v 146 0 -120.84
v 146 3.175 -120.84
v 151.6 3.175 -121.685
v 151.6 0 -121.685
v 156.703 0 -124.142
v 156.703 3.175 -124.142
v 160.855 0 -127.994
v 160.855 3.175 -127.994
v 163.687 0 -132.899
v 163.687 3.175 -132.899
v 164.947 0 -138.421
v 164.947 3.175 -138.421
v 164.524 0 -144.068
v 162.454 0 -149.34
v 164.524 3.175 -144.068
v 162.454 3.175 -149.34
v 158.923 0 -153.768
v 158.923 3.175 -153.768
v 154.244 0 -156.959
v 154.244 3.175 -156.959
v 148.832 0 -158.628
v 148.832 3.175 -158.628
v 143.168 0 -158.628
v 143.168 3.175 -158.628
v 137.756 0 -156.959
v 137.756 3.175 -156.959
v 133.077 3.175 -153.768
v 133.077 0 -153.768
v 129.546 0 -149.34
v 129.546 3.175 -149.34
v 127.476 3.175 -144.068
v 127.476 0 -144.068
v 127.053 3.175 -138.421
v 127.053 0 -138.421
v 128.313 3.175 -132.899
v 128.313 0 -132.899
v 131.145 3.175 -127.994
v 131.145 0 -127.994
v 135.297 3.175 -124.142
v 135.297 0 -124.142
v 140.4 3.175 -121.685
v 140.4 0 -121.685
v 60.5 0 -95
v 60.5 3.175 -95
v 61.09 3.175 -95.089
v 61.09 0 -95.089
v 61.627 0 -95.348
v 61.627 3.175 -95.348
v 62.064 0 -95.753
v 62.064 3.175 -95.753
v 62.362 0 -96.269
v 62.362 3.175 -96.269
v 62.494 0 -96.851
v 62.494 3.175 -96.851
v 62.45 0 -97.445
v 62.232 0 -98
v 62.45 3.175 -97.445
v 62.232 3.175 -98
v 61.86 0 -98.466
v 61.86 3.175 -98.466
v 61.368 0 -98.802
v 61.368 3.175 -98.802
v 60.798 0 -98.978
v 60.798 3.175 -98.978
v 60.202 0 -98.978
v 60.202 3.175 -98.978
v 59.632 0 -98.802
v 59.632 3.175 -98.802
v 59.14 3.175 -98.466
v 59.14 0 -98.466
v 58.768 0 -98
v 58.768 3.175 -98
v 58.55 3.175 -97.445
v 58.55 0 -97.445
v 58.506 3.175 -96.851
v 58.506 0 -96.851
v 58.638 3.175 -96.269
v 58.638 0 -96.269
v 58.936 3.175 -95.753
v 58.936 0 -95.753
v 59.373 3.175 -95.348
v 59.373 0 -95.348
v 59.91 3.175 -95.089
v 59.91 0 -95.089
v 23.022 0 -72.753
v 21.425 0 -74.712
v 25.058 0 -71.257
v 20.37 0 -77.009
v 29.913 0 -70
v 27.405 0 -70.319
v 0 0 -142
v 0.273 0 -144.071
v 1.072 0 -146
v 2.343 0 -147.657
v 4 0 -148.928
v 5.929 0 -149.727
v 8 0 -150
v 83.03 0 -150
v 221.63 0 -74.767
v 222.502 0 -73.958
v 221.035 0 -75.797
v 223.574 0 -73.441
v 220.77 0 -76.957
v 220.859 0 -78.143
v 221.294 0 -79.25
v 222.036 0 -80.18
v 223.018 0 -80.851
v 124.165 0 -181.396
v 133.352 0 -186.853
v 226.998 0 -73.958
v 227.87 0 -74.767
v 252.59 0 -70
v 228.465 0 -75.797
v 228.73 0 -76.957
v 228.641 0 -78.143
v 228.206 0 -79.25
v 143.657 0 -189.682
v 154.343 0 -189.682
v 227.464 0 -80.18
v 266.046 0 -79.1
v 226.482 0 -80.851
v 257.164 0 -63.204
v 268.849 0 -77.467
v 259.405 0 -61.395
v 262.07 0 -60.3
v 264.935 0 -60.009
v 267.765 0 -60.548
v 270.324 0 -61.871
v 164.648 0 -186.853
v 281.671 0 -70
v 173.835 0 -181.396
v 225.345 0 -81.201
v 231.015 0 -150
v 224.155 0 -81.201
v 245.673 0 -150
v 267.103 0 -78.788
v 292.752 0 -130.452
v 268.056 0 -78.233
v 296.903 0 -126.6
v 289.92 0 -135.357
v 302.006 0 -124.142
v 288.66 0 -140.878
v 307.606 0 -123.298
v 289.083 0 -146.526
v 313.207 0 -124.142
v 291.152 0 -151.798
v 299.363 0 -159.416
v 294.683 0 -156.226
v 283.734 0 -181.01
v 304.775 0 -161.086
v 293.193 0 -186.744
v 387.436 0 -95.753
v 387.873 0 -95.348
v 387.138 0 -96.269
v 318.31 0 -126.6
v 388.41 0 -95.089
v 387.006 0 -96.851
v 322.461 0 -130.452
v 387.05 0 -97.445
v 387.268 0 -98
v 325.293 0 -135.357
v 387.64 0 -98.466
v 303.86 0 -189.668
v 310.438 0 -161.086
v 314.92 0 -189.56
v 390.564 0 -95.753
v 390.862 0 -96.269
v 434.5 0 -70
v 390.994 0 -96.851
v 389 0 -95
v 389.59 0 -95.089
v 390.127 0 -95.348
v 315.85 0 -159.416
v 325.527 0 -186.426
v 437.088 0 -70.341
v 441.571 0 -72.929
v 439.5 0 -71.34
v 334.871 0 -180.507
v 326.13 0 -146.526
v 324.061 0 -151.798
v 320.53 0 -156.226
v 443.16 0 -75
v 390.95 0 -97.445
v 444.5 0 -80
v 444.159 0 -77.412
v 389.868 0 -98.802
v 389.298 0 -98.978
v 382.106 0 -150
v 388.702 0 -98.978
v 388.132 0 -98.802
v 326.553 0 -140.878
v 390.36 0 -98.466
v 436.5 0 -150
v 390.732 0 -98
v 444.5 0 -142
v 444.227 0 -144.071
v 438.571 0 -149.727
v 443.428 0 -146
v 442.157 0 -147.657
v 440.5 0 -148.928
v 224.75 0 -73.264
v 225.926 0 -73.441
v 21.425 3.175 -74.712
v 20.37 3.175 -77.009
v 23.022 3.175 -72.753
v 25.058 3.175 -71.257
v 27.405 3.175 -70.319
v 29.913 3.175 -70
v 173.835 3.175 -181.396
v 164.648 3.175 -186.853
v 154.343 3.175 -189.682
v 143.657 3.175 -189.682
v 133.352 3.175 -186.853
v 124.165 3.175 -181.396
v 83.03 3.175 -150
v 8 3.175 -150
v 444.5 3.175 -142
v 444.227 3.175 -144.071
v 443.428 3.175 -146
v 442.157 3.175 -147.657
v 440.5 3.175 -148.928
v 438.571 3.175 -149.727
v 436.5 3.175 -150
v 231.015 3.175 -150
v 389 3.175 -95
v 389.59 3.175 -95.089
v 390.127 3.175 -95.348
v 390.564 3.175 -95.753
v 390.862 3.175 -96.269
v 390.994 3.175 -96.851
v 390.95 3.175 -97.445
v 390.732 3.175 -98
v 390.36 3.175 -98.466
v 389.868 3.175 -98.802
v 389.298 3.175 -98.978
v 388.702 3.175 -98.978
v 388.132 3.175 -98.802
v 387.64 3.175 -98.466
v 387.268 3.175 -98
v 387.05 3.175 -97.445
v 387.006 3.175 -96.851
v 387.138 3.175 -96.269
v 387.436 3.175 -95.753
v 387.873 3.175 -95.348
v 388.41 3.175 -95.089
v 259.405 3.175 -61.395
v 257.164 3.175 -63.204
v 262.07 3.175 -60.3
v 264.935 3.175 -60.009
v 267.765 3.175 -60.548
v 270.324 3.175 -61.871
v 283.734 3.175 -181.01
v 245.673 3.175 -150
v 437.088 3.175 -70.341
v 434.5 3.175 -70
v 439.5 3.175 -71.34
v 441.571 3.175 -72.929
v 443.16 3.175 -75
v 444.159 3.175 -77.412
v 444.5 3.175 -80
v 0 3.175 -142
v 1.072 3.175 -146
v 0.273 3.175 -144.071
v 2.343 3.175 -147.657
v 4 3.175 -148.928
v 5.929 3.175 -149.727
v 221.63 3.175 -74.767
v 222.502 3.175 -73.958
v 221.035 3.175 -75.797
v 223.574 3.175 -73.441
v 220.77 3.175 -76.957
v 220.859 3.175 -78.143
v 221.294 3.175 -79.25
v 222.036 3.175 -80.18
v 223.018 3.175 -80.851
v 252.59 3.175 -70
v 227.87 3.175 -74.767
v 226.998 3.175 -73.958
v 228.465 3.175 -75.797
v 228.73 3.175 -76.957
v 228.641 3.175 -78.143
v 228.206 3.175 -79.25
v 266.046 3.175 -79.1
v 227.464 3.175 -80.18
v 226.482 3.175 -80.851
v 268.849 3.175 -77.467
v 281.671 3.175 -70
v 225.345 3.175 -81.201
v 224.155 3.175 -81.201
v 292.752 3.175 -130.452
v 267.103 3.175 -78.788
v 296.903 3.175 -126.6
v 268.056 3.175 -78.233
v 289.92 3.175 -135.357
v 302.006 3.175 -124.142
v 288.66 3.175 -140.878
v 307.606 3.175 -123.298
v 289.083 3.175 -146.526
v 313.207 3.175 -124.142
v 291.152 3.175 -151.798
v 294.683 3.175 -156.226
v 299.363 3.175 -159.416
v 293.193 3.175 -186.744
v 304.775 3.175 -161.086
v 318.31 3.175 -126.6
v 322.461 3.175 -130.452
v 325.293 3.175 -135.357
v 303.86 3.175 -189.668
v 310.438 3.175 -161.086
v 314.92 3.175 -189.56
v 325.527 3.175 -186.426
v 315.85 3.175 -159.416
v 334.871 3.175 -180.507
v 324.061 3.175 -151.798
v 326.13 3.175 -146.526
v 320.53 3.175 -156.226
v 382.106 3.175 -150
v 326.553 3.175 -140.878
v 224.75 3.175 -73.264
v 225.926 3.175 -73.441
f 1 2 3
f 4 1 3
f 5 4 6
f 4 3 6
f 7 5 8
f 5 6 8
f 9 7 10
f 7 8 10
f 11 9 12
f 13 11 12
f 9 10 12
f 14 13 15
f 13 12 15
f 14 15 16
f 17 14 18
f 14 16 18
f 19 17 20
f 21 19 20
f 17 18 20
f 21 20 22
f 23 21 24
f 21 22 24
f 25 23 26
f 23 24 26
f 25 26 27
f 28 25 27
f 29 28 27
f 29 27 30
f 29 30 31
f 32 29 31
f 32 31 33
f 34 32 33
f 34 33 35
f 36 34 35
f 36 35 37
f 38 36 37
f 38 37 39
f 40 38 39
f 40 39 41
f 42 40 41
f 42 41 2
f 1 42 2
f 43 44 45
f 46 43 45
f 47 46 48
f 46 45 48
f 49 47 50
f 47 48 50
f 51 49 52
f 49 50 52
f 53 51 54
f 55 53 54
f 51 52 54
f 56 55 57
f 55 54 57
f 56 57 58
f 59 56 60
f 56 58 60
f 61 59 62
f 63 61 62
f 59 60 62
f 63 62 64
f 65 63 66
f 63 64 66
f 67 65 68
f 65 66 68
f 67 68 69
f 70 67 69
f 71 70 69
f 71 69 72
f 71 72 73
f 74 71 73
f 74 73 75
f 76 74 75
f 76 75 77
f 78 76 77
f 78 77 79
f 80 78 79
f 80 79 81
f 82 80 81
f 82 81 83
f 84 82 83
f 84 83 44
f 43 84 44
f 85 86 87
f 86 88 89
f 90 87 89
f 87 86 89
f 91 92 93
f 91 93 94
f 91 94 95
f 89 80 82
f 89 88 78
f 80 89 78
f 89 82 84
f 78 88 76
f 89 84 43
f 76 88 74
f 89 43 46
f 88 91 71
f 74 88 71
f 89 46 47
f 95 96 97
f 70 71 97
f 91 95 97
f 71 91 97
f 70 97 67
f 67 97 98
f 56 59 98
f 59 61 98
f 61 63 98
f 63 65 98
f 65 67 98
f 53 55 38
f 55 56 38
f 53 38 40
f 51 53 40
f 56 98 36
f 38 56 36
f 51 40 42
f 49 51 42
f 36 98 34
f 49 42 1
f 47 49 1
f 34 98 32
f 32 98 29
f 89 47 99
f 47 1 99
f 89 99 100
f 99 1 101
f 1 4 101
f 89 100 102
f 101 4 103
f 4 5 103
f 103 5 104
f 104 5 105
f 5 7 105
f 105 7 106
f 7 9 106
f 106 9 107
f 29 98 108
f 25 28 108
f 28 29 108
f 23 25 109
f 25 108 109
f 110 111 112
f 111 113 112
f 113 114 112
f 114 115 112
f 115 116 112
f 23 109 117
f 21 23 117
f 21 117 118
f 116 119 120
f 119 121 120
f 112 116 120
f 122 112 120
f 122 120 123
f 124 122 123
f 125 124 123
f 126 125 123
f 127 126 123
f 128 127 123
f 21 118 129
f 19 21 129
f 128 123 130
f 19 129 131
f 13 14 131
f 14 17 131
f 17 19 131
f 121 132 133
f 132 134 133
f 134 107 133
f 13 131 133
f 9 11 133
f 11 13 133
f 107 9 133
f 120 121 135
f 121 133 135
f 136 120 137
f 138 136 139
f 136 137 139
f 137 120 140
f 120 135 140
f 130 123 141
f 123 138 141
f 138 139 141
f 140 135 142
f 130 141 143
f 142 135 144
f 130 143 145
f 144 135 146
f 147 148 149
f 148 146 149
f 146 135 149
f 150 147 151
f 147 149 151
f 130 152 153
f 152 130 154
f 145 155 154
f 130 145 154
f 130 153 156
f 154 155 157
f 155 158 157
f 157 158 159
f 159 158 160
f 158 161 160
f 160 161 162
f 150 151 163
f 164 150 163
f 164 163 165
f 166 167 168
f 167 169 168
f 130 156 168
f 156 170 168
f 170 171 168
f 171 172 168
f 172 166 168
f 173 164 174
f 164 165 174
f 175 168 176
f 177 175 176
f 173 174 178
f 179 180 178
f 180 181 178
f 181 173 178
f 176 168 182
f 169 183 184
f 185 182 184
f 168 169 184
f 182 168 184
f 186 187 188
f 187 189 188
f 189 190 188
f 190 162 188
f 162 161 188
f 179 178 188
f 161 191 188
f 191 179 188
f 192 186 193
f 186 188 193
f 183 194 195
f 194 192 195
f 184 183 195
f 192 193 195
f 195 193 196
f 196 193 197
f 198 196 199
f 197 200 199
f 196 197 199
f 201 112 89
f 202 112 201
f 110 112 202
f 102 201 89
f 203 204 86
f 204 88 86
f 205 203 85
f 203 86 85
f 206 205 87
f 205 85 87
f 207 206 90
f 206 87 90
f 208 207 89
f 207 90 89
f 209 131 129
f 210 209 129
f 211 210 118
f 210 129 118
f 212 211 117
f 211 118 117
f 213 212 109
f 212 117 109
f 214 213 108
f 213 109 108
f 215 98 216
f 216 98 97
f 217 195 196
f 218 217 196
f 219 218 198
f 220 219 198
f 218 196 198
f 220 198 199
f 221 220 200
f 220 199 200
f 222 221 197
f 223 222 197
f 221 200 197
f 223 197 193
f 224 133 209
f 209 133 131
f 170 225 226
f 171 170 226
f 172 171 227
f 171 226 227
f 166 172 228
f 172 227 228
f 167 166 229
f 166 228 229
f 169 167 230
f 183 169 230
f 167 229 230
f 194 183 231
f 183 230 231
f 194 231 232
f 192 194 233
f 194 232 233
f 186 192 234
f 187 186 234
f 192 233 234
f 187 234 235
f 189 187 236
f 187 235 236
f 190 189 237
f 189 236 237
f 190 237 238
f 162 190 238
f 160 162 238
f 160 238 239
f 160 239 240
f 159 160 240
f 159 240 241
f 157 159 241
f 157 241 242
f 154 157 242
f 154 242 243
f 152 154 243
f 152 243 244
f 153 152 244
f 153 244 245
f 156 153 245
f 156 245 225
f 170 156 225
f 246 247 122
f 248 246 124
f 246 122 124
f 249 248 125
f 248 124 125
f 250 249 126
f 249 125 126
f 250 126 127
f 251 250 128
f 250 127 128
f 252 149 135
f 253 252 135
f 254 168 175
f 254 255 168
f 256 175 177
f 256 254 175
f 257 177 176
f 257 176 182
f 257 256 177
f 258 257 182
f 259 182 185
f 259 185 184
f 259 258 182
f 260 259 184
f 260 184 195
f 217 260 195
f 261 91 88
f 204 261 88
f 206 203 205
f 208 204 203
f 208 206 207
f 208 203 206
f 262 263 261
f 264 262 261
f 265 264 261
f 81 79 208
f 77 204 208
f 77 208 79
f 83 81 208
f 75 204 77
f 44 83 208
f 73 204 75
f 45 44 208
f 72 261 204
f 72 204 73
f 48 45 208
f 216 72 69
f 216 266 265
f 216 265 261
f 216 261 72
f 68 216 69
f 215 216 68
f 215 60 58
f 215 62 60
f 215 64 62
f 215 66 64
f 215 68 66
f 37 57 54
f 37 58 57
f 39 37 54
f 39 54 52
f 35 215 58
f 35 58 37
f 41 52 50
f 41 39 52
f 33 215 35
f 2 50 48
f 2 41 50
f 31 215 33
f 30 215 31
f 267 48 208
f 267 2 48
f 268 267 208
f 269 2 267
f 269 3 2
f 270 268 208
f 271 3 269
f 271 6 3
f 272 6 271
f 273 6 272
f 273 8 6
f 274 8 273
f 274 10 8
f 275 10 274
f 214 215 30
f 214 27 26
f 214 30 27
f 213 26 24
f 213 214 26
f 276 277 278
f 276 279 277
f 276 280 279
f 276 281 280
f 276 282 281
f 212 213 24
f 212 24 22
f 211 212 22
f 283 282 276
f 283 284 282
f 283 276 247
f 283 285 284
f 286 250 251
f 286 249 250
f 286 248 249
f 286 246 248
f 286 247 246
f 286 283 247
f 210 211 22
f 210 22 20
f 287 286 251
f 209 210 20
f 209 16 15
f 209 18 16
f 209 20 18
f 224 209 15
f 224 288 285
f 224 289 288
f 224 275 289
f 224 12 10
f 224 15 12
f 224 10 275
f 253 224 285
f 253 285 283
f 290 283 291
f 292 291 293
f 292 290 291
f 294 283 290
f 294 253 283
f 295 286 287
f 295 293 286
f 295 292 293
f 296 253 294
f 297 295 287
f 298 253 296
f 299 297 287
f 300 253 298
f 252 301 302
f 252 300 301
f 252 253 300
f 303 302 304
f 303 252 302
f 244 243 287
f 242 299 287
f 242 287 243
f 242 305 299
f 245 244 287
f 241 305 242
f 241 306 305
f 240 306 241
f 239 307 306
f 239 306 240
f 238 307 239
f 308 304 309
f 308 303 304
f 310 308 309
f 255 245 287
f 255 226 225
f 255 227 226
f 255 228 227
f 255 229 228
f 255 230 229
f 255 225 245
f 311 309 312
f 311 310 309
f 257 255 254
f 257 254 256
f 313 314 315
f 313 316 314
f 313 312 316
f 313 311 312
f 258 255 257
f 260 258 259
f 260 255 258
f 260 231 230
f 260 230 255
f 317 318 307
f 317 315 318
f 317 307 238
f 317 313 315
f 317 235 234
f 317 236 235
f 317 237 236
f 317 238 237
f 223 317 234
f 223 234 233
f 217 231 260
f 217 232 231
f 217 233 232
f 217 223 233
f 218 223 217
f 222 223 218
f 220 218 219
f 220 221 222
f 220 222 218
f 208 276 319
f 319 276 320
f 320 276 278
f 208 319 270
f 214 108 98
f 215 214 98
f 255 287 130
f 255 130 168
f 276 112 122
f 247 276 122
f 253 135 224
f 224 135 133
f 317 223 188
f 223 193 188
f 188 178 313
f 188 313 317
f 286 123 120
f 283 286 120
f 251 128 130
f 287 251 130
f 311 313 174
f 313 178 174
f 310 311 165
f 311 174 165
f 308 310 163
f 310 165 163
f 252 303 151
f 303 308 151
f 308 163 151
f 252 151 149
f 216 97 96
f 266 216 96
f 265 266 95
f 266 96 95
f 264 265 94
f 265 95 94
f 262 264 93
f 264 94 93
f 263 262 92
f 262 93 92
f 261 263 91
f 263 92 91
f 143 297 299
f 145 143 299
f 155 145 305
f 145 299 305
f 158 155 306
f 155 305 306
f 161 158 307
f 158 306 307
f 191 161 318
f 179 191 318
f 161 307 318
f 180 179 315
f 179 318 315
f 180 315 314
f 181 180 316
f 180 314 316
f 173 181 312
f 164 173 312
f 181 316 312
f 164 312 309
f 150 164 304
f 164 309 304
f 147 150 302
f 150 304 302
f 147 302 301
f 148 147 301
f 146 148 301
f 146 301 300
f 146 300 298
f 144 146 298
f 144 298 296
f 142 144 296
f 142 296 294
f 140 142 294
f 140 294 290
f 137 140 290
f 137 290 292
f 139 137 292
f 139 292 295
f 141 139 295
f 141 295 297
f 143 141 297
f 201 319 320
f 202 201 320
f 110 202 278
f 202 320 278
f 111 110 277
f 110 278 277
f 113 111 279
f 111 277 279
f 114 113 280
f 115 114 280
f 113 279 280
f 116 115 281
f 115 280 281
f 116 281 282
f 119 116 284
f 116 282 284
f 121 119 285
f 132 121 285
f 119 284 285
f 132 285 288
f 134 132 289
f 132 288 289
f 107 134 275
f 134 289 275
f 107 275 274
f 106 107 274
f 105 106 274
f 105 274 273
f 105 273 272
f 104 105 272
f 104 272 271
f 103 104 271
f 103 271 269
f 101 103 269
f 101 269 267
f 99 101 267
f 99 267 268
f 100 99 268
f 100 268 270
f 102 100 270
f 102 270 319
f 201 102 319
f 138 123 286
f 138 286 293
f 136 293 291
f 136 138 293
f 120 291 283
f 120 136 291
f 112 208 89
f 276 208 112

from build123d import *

# Parameters (mm, degrees)
SKETCH1_R                = 4.6
BOSS_EXTRUDE1_DEPTH      = 3.175
SKETCH2_W                = 597.466303312
SKETCH2_H                = 60.972543052
CUT_EXTRUDE1_DEPTH       = 70
FILLET1_R                = 10
FILLET2_R                = 10
SKETCH3_R                = 3.990837639
CUT_EXTRUDE2_DEPTH       = 10
SKETCH4_R                = 2
CUT_EXTRUDE3_DEPTH       = 470.13785887
SKETCH5_R                = 2
CUT_EXTRUDE4_DEPTH       = 10
SKETCH6_R                = 40
BOSS_EXTRUDE2_DEPTH      = 3.175
BOSS_EXTRUDE3_DEPTH      = 3.175
SKETCH9_R                = 40
BOSS_EXTRUDE4_DEPTH      = 3.175
BOSS_EXTRUDE6_DEPTH      = 3.175
SKETCH13_R               = 19
CUT_EXTRUDE5_DEPTH       = 10
SKETCH14_R               = 19
CUT_EXTRUDE6_DEPTH       = 10
BOSS_EXTRUDE7_DEPTH      = 10
BOSS_EXTRUDE7_DEPTH_BACK = 3.175
SKETCH16_W               = 39.380598922
SKETCH16_H               = 33.904845405
CUT_EXTRUDE7_DEPTH       = 10


with BuildPart() as part:
    # Sketch1 → Boss-Extrude1 (new body)
    with BuildSketch(Plane(origin=(0, 0, 0), x_dir=(1, 0, 0), z_dir=(0, 1, 0))):
        with BuildLine():
            ThreePointArc((8, 150), (2.343145751, 147.656854249), (0, 142))
            Line((0, 142), (42, 8))
            ThreePointArc((42, 8), (44.343145751, 2.343145751), (50, 0))
            Line((50, 0), (436.5, 0))
            ThreePointArc((436.5, 0), (442.156854249, 2.343145751), (444.5, 8))
            Line((444.5, 8), (444.5, 142))
            ThreePointArc((444.5, 142), (442.156854249, 147.656854249), (436.5, 150))
            Line((436.5, 150), (172.868406334, 150))
            ThreePointArc((172.868406334, 150), (172.5, 146.64039861), (172.131593666, 150))
            Line((172.131593666, 150), (8, 150))
        make_face()
        with Locations(Location((265.281257274, 74.563866981, 0), (0, 0, 270))):
            Circle(SKETCH1_R, mode=Mode.SUBTRACT)
    extrude(amount=BOSS_EXTRUDE1_DEPTH)

    # Sketch2 → Cut-Extrude1 (cut)
    with BuildSketch(Plane.XY):
        with Locations((220.1785332, 7.544358636)):
            Rectangle(SKETCH2_W, SKETCH2_H)
    extrude(amount=-CUT_EXTRUDE1_DEPTH, mode=Mode.SUBTRACT)

    # Fillet1
    fillet1_edges = [part.edges().sort_by_distance(p)[0] for p in [
        (22.567164179, 1.5875, -70),
    ]]
    fillet(fillet1_edges, radius=FILLET1_R)

    # Fillet2
    fillet2_edges = [part.edges().sort_by_distance(p)[0] for p in [
        (444.5, 1.5875, -70),
    ]]
    fillet(fillet2_edges, radius=FILLET2_R)

    # Sketch3 → Cut-Extrude2 (cut)
    with BuildSketch(Plane(origin=(0, 3.175, 0), x_dir=(1, 0, 0), z_dir=(0, 1, 0))):
        with Locations(Location((224.75, 77.255, 0), (0, 0, 270))):
            Circle(SKETCH3_R)
    extrude(amount=-CUT_EXTRUDE2_DEPTH, mode=Mode.SUBTRACT)

    # Sketch4 → Cut-Extrude3 (cut, through all)
    with BuildSketch(Plane(origin=(0, 3.175, 0), x_dir=(1, 0, 0), z_dir=(0, 1, 0))):
        with Locations(Location((60.5, 97, 0), (0, 0, 270))):
            Circle(SKETCH4_R)
    extrude(amount=-CUT_EXTRUDE3_DEPTH, mode=Mode.SUBTRACT)

    # Sketch5 → Cut-Extrude4 (cut)
    with BuildSketch(Plane(origin=(0, 3.175, 0), x_dir=(1, 0, 0), z_dir=(0, 1, 0))):
        with Locations(Location((389, 97, 0), (0, 0, 270))):
            Circle(SKETCH5_R)
    extrude(amount=-CUT_EXTRUDE4_DEPTH, mode=Mode.SUBTRACT)

    # Sketch6 → Boss-Extrude2 (add)
    with BuildSketch(Plane(origin=(0, 0, 0), x_dir=(1, 0, 0), z_dir=(0, 1, 0))):
        with Locations((149, 150.04039861)):
            Circle(SKETCH6_R)
    extrude(amount=BOSS_EXTRUDE2_DEPTH)

    # Sketch7 → Boss-Extrude3 (add)
    with BuildSketch(Plane(origin=(0, 0, 0), x_dir=(1, 0, 0), z_dir=(0, 1, 0))):
        Polygon((124.164543783, 181.396420591), (82.702881078, 149.750534228), (231.468946681, 149.750534228), (173.835456217, 181.396420591), align=None)
    extrude(amount=BOSS_EXTRUDE3_DEPTH)

    # Sketch9 → Boss-Extrude4 (add)
    with BuildSketch(Plane(origin=(0, 0, 0), x_dir=(1, 0, 0), z_dir=(0, 1, 0))):
        with BuildLine():
            ThreePointArc((269, 150), (272.870833001, 167.166341835), (283.734164599, 181.010281545))
            Line((283.734164599, 181.010281545), (245.673378314, 150))
            Line((245.673378314, 150), (269, 150))
        make_face()
        with Locations((309, 150)):
            Circle(SKETCH9_R)
    extrude(amount=BOSS_EXTRUDE4_DEPTH)

    # Sketch12 → Boss-Extrude6 (add)
    with BuildSketch(Plane(origin=(0, 0, 0), x_dir=(1, 0, 0), z_dir=(0, 1, 0))):
        Polygon((326.166341835, 186.129166999), (382.106475607, 150), (340.398839744, 150), align=None)
    extrude(amount=BOSS_EXTRUDE6_DEPTH)

    # Sketch13 → Cut-Extrude5 (cut)
    with BuildSketch(Plane(origin=(0, 3.175, 0), x_dir=(1, 0, 0), z_dir=(0, 1, 0))):
        with Locations(Location((146, 139.84039861, 0), (0, 0, 270))):
            Circle(SKETCH13_R)
    extrude(amount=-CUT_EXTRUDE5_DEPTH, mode=Mode.SUBTRACT)

    # Sketch14 → Cut-Extrude6 (cut)
    with BuildSketch(Plane(origin=(0, 3.175, 0), x_dir=(1, 0, 0), z_dir=(0, 1, 0))):
        with Locations(Location((307.606475607, 142.298064477, 0), (0, 0, 270))):
            Circle(SKETCH14_R)
    extrude(amount=-CUT_EXTRUDE6_DEPTH, mode=Mode.SUBTRACT)

    # Sketch15 → Boss-Extrude7 (add, two sides: drawn at the far end of the back side and taken through both)
    with BuildSketch(Plane(origin=(0, 3.175, 0), x_dir=(1, 0, 0), z_dir=(0, 1, 0)).offset(-BOSS_EXTRUDE7_DEPTH_BACK)):
        with BuildLine():
            Line((270.323640372, 61.870718801), (281.671389991, 70))
            Line((281.671389991, 70), (265.856685963, 70))
            ThreePointArc((265.856685963, 70), (269.551101507, 72.852601302), (268.849345077, 77.467097842))
            Line((268.849345077, 77.467097842), (266.045546336, 79.099929396))
            ThreePointArc((266.045546336, 79.099929396), (260.730312777, 75.233870106), (264.705828584, 70))
            Line((264.705828584, 70), (252.589726142, 70))
            Line((252.589726142, 70), (257.164027826, 63.204154779))
            ThreePointArc((257.164027826, 63.204154779), (263.491883069, 60.050944756), (270.323640372, 61.870718801))
        make_face()
    extrude(amount=BOSS_EXTRUDE7_DEPTH + BOSS_EXTRUDE7_DEPTH_BACK)

    # Sketch16 → Cut-Extrude7 (cut)
    with BuildSketch(Plane(origin=(0, 13.175, 0), x_dir=(1, 0, 0), z_dir=(0, 1, 0))):
        with Locations((267.135263248, 68.050551455)):
            Rectangle(SKETCH16_W, SKETCH16_H)
    extrude(amount=-CUT_EXTRUDE7_DEPTH, mode=Mode.SUBTRACT)


solid = part.part
